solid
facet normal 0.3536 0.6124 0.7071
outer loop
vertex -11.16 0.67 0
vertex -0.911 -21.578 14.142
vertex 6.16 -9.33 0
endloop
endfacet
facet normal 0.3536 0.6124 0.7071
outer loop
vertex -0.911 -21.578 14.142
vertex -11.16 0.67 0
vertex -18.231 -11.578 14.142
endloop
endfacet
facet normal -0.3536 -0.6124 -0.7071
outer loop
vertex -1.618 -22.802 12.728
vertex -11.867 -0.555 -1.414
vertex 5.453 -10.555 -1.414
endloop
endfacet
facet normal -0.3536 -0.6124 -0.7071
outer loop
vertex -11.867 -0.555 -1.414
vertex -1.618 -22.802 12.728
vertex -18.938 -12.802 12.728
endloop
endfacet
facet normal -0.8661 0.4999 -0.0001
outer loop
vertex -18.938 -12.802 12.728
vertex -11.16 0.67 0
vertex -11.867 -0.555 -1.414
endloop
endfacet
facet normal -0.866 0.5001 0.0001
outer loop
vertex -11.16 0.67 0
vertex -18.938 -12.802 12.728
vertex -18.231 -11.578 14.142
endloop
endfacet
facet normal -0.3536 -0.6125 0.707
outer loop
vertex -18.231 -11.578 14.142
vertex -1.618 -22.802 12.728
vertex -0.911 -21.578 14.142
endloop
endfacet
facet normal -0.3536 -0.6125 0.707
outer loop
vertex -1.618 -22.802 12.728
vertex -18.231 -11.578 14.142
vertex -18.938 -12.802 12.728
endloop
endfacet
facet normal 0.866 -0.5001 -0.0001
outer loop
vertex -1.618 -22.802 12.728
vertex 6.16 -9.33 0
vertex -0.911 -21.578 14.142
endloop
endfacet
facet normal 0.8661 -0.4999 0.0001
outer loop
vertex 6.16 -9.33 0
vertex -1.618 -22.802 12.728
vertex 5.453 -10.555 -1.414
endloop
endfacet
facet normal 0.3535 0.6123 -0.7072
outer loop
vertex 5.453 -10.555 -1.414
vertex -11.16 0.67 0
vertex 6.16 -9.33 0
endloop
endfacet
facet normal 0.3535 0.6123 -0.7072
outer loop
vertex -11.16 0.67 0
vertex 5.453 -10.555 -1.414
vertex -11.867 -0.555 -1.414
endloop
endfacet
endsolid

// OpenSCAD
rotate([0, 0, 240])
translate([5, 0, 0])
rotate([0, -45, 0])
translate([10, 0, -1])
cube([20, 20, 2], center=true);
